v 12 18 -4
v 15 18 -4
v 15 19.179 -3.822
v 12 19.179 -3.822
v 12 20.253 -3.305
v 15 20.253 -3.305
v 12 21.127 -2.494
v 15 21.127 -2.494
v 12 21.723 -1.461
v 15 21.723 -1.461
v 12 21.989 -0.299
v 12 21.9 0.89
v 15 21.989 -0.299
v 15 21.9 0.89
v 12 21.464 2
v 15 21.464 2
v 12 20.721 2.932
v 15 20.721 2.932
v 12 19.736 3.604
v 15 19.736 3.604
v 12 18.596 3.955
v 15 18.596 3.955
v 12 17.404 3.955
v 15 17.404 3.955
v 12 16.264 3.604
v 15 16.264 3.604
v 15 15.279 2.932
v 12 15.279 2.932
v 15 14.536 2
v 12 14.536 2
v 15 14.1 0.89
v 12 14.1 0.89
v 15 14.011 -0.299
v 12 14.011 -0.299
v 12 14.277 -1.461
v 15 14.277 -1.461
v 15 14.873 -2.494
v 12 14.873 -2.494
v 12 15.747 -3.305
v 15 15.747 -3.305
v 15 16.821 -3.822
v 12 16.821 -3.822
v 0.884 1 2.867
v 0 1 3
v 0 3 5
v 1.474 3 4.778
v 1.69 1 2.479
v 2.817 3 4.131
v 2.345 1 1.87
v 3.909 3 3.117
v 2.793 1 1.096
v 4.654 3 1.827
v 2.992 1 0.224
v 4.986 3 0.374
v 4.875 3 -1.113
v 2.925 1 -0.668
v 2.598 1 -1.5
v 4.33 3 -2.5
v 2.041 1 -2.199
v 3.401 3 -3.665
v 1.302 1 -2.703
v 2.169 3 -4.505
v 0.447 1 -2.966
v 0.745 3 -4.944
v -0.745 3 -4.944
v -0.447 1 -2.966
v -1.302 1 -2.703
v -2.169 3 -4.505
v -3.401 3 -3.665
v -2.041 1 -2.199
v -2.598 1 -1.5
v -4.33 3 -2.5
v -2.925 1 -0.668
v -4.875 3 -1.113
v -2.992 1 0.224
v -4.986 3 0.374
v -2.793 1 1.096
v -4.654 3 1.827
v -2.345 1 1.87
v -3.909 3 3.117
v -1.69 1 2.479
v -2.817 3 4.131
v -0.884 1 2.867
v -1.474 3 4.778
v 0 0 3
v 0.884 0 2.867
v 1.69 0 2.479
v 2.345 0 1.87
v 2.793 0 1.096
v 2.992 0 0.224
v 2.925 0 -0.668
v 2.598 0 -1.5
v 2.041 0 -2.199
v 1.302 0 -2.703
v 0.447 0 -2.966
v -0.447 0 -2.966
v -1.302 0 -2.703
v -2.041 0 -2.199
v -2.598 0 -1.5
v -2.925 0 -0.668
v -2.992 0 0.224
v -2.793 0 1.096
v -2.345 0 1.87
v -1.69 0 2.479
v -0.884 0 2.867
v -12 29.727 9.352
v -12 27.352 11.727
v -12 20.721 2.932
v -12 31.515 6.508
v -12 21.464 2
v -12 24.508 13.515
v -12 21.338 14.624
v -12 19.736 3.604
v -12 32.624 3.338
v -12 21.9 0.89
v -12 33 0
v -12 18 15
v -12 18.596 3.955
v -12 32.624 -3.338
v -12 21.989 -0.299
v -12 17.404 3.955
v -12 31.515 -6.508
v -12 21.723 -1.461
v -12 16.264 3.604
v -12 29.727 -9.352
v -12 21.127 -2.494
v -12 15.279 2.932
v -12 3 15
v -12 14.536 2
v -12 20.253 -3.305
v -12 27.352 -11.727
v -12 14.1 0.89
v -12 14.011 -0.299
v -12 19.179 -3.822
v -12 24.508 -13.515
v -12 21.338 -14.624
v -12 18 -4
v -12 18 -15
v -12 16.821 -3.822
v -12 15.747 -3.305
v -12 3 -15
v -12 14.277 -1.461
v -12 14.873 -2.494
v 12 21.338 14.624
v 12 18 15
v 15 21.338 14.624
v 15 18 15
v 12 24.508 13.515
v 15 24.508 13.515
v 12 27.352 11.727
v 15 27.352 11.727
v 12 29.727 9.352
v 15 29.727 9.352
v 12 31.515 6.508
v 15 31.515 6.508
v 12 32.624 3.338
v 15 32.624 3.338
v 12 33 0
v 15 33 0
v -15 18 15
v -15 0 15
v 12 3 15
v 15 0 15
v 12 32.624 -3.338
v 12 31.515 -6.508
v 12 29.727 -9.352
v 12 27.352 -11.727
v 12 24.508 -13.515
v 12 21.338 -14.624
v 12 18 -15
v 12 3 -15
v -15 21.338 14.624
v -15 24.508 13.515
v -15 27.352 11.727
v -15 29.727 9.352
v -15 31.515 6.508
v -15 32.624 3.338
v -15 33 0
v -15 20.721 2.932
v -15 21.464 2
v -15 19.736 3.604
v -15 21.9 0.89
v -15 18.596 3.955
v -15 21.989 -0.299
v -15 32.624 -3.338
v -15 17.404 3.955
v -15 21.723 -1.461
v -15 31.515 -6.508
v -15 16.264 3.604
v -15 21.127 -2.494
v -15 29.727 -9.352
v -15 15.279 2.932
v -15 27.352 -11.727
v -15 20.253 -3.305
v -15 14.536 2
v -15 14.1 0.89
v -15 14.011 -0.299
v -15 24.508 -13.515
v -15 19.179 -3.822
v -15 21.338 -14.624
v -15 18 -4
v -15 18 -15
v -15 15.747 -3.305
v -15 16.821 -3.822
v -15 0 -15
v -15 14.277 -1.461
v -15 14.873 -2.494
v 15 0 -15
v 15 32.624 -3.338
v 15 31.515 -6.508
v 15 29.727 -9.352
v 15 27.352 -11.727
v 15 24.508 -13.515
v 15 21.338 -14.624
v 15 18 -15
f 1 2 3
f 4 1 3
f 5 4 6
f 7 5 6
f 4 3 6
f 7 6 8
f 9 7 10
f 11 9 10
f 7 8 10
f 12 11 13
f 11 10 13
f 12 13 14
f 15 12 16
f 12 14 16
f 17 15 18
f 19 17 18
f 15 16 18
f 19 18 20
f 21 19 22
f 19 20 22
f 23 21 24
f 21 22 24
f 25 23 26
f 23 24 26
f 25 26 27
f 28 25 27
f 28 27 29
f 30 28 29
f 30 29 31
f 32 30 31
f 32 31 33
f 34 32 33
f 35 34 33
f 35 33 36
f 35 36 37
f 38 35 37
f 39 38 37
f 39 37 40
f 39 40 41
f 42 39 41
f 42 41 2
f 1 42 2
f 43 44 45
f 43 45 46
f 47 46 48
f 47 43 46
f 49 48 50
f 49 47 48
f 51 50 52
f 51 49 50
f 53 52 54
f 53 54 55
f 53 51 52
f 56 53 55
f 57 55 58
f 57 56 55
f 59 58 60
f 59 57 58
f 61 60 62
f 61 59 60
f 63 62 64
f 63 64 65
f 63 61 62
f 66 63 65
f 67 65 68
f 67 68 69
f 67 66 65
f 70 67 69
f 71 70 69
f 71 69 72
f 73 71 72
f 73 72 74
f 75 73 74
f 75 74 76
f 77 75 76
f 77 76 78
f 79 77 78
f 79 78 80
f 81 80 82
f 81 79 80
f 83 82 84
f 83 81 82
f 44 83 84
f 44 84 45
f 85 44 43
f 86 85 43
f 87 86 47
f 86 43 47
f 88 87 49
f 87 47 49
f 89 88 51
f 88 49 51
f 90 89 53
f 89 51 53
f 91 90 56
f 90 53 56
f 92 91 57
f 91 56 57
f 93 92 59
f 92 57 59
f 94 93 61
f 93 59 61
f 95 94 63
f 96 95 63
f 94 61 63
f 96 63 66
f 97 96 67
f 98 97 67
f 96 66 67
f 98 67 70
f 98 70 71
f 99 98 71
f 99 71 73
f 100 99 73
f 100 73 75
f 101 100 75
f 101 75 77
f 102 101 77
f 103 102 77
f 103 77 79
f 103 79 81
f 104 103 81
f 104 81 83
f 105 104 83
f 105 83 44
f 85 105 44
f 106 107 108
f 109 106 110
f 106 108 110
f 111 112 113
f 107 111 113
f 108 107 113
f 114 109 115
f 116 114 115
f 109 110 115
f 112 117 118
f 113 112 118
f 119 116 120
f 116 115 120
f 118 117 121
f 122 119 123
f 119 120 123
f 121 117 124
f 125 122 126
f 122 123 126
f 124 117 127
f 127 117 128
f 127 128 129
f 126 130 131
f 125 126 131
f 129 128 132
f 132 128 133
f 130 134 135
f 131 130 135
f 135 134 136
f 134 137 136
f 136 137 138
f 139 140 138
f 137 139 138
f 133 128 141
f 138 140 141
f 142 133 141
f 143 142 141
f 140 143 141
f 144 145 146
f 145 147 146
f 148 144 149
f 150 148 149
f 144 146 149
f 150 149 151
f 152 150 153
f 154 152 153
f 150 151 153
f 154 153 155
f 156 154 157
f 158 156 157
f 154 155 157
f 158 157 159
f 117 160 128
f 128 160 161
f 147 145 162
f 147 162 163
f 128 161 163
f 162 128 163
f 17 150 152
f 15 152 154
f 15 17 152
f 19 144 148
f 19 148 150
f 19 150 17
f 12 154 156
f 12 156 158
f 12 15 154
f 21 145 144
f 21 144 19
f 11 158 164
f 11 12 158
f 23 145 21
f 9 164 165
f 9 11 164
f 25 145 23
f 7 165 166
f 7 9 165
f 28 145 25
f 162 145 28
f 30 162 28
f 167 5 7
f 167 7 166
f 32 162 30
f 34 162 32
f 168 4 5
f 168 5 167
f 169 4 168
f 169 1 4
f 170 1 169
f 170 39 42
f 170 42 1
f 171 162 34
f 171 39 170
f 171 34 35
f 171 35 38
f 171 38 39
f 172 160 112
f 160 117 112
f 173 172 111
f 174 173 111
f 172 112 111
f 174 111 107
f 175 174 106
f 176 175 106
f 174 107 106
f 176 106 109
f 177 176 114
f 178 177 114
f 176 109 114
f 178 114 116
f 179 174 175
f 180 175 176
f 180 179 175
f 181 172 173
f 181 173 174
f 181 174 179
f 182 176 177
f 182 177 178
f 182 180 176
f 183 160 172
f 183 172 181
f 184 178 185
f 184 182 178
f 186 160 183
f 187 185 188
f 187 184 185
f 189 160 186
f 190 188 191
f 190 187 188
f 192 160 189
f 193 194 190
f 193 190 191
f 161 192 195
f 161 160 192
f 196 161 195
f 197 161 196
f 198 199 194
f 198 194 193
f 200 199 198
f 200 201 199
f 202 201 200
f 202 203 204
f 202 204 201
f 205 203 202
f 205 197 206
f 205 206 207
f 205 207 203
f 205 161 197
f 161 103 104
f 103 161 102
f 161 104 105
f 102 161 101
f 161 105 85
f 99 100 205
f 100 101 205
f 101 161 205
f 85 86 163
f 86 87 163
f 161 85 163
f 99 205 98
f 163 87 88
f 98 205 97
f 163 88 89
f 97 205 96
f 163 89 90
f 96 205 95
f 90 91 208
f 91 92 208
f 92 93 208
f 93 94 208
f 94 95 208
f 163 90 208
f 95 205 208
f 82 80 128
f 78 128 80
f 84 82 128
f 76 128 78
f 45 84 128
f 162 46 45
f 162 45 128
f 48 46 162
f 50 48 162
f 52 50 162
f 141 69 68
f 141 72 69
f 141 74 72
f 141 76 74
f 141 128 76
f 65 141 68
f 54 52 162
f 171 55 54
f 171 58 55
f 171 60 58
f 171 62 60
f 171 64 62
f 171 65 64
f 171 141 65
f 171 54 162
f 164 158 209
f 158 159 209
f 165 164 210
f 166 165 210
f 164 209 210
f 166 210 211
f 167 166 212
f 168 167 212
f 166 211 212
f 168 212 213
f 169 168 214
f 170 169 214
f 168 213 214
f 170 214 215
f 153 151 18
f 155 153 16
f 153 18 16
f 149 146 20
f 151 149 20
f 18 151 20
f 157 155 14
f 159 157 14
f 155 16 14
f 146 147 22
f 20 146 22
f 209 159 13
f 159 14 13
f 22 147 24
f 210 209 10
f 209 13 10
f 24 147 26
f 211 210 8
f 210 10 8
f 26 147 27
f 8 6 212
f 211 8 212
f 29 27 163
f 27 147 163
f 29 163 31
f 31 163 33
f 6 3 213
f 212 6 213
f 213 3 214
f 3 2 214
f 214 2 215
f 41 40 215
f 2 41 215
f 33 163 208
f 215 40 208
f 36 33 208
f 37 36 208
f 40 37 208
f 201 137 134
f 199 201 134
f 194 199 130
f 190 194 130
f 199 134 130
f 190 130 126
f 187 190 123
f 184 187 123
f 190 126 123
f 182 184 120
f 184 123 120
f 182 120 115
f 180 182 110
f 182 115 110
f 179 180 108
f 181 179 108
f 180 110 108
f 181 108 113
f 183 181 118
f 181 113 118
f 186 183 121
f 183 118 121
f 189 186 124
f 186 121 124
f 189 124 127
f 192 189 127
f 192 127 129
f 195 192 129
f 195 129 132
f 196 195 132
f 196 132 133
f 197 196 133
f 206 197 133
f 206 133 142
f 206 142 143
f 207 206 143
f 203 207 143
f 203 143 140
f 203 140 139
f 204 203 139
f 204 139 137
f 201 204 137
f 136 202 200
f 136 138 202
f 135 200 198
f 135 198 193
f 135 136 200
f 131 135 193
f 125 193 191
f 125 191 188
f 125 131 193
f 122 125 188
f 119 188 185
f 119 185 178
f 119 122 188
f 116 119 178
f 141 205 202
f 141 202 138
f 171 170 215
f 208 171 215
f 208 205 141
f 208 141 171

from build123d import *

# Parameters (mm, degrees)
CROQUIS1_W              = 30
CROQUIS1_H              = 30
SALIENTE_EXTRUIR1_DEPTH = 3
CROQUIS2_W              = 3
CROQUIS2_H              = 30
SALIENTE_EXTRUIR2_DEPTH = 30
REDONDEO1_R             = 15
CROQUIS3_R              = 4
CORTAR_EXTRUIR1_DEPTH   = 48.053161424
CROQUIS4_R              = 3
CORTAR_EXTRUIR2_DEPTH   = 37.742346142
CHAFL_N1_SIZE           = 2


with BuildPart() as part:
    # Croquis1 → Saliente-Extruir1 (new body)
    with BuildSketch(Plane(origin=(0, 0, 0), x_dir=(1, 0, 0), z_dir=(0, 1, 0))):
        Rectangle(CROQUIS1_W, CROQUIS1_H)
    extrude(amount=SALIENTE_EXTRUIR1_DEPTH)

    # Croquis2 → Saliente-Extruir2 (add)
    with BuildSketch(Plane(origin=(0, 3, 0), x_dir=(1, 0, 0), z_dir=(0, 1, 0))):
        with Locations((-13.5, 0)):
            Rectangle(CROQUIS2_W, CROQUIS2_H)
        with Locations((13.5, 0)):
            Rectangle(CROQUIS2_W, CROQUIS2_H)
    extrude(amount=SALIENTE_EXTRUIR2_DEPTH)

    # Redondeo1
    redondeo1_edges = [part.edges().sort_by_distance(p)[0] for p in [
        (-13.5, 33, -15),
        (13.5, 33, -15),
        (13.5, 33, 15),
        (-13.5, 33, 15),
    ]]
    fillet(redondeo1_edges, radius=REDONDEO1_R - 0.0001)  # a hair under: the kernel refuses the full size

    # Croquis3 → Cortar-Extruir1 (cut, through all)
    with BuildSketch(Plane(origin=(15, 0, 0), x_dir=(0, 0, -1), z_dir=(1, 0, 0))):
        with Locations((0, 18)):
            Circle(CROQUIS3_R)
    extrude(amount=-CORTAR_EXTRUIR1_DEPTH, mode=Mode.SUBTRACT)

    # Croquis4 → Cortar-Extruir2 (cut, through all)
    with BuildSketch(Plane(origin=(0, 3, 0), x_dir=(1, 0, 0), z_dir=(0, 1, 0))):
        with Locations(Location((0, 0, 0), (0, 0, 270))):
            Circle(CROQUIS4_R)
    extrude(amount=-CORTAR_EXTRUIR2_DEPTH, mode=Mode.SUBTRACT)

    # Chaflán1
    chafl_n1_edges = [part.edges().sort_by_distance(p)[0] for p in [
        (0, 3, -3),
    ]]
    chamfer(chafl_n1_edges, length=CHAFL_N1_SIZE)


solid = part.part
